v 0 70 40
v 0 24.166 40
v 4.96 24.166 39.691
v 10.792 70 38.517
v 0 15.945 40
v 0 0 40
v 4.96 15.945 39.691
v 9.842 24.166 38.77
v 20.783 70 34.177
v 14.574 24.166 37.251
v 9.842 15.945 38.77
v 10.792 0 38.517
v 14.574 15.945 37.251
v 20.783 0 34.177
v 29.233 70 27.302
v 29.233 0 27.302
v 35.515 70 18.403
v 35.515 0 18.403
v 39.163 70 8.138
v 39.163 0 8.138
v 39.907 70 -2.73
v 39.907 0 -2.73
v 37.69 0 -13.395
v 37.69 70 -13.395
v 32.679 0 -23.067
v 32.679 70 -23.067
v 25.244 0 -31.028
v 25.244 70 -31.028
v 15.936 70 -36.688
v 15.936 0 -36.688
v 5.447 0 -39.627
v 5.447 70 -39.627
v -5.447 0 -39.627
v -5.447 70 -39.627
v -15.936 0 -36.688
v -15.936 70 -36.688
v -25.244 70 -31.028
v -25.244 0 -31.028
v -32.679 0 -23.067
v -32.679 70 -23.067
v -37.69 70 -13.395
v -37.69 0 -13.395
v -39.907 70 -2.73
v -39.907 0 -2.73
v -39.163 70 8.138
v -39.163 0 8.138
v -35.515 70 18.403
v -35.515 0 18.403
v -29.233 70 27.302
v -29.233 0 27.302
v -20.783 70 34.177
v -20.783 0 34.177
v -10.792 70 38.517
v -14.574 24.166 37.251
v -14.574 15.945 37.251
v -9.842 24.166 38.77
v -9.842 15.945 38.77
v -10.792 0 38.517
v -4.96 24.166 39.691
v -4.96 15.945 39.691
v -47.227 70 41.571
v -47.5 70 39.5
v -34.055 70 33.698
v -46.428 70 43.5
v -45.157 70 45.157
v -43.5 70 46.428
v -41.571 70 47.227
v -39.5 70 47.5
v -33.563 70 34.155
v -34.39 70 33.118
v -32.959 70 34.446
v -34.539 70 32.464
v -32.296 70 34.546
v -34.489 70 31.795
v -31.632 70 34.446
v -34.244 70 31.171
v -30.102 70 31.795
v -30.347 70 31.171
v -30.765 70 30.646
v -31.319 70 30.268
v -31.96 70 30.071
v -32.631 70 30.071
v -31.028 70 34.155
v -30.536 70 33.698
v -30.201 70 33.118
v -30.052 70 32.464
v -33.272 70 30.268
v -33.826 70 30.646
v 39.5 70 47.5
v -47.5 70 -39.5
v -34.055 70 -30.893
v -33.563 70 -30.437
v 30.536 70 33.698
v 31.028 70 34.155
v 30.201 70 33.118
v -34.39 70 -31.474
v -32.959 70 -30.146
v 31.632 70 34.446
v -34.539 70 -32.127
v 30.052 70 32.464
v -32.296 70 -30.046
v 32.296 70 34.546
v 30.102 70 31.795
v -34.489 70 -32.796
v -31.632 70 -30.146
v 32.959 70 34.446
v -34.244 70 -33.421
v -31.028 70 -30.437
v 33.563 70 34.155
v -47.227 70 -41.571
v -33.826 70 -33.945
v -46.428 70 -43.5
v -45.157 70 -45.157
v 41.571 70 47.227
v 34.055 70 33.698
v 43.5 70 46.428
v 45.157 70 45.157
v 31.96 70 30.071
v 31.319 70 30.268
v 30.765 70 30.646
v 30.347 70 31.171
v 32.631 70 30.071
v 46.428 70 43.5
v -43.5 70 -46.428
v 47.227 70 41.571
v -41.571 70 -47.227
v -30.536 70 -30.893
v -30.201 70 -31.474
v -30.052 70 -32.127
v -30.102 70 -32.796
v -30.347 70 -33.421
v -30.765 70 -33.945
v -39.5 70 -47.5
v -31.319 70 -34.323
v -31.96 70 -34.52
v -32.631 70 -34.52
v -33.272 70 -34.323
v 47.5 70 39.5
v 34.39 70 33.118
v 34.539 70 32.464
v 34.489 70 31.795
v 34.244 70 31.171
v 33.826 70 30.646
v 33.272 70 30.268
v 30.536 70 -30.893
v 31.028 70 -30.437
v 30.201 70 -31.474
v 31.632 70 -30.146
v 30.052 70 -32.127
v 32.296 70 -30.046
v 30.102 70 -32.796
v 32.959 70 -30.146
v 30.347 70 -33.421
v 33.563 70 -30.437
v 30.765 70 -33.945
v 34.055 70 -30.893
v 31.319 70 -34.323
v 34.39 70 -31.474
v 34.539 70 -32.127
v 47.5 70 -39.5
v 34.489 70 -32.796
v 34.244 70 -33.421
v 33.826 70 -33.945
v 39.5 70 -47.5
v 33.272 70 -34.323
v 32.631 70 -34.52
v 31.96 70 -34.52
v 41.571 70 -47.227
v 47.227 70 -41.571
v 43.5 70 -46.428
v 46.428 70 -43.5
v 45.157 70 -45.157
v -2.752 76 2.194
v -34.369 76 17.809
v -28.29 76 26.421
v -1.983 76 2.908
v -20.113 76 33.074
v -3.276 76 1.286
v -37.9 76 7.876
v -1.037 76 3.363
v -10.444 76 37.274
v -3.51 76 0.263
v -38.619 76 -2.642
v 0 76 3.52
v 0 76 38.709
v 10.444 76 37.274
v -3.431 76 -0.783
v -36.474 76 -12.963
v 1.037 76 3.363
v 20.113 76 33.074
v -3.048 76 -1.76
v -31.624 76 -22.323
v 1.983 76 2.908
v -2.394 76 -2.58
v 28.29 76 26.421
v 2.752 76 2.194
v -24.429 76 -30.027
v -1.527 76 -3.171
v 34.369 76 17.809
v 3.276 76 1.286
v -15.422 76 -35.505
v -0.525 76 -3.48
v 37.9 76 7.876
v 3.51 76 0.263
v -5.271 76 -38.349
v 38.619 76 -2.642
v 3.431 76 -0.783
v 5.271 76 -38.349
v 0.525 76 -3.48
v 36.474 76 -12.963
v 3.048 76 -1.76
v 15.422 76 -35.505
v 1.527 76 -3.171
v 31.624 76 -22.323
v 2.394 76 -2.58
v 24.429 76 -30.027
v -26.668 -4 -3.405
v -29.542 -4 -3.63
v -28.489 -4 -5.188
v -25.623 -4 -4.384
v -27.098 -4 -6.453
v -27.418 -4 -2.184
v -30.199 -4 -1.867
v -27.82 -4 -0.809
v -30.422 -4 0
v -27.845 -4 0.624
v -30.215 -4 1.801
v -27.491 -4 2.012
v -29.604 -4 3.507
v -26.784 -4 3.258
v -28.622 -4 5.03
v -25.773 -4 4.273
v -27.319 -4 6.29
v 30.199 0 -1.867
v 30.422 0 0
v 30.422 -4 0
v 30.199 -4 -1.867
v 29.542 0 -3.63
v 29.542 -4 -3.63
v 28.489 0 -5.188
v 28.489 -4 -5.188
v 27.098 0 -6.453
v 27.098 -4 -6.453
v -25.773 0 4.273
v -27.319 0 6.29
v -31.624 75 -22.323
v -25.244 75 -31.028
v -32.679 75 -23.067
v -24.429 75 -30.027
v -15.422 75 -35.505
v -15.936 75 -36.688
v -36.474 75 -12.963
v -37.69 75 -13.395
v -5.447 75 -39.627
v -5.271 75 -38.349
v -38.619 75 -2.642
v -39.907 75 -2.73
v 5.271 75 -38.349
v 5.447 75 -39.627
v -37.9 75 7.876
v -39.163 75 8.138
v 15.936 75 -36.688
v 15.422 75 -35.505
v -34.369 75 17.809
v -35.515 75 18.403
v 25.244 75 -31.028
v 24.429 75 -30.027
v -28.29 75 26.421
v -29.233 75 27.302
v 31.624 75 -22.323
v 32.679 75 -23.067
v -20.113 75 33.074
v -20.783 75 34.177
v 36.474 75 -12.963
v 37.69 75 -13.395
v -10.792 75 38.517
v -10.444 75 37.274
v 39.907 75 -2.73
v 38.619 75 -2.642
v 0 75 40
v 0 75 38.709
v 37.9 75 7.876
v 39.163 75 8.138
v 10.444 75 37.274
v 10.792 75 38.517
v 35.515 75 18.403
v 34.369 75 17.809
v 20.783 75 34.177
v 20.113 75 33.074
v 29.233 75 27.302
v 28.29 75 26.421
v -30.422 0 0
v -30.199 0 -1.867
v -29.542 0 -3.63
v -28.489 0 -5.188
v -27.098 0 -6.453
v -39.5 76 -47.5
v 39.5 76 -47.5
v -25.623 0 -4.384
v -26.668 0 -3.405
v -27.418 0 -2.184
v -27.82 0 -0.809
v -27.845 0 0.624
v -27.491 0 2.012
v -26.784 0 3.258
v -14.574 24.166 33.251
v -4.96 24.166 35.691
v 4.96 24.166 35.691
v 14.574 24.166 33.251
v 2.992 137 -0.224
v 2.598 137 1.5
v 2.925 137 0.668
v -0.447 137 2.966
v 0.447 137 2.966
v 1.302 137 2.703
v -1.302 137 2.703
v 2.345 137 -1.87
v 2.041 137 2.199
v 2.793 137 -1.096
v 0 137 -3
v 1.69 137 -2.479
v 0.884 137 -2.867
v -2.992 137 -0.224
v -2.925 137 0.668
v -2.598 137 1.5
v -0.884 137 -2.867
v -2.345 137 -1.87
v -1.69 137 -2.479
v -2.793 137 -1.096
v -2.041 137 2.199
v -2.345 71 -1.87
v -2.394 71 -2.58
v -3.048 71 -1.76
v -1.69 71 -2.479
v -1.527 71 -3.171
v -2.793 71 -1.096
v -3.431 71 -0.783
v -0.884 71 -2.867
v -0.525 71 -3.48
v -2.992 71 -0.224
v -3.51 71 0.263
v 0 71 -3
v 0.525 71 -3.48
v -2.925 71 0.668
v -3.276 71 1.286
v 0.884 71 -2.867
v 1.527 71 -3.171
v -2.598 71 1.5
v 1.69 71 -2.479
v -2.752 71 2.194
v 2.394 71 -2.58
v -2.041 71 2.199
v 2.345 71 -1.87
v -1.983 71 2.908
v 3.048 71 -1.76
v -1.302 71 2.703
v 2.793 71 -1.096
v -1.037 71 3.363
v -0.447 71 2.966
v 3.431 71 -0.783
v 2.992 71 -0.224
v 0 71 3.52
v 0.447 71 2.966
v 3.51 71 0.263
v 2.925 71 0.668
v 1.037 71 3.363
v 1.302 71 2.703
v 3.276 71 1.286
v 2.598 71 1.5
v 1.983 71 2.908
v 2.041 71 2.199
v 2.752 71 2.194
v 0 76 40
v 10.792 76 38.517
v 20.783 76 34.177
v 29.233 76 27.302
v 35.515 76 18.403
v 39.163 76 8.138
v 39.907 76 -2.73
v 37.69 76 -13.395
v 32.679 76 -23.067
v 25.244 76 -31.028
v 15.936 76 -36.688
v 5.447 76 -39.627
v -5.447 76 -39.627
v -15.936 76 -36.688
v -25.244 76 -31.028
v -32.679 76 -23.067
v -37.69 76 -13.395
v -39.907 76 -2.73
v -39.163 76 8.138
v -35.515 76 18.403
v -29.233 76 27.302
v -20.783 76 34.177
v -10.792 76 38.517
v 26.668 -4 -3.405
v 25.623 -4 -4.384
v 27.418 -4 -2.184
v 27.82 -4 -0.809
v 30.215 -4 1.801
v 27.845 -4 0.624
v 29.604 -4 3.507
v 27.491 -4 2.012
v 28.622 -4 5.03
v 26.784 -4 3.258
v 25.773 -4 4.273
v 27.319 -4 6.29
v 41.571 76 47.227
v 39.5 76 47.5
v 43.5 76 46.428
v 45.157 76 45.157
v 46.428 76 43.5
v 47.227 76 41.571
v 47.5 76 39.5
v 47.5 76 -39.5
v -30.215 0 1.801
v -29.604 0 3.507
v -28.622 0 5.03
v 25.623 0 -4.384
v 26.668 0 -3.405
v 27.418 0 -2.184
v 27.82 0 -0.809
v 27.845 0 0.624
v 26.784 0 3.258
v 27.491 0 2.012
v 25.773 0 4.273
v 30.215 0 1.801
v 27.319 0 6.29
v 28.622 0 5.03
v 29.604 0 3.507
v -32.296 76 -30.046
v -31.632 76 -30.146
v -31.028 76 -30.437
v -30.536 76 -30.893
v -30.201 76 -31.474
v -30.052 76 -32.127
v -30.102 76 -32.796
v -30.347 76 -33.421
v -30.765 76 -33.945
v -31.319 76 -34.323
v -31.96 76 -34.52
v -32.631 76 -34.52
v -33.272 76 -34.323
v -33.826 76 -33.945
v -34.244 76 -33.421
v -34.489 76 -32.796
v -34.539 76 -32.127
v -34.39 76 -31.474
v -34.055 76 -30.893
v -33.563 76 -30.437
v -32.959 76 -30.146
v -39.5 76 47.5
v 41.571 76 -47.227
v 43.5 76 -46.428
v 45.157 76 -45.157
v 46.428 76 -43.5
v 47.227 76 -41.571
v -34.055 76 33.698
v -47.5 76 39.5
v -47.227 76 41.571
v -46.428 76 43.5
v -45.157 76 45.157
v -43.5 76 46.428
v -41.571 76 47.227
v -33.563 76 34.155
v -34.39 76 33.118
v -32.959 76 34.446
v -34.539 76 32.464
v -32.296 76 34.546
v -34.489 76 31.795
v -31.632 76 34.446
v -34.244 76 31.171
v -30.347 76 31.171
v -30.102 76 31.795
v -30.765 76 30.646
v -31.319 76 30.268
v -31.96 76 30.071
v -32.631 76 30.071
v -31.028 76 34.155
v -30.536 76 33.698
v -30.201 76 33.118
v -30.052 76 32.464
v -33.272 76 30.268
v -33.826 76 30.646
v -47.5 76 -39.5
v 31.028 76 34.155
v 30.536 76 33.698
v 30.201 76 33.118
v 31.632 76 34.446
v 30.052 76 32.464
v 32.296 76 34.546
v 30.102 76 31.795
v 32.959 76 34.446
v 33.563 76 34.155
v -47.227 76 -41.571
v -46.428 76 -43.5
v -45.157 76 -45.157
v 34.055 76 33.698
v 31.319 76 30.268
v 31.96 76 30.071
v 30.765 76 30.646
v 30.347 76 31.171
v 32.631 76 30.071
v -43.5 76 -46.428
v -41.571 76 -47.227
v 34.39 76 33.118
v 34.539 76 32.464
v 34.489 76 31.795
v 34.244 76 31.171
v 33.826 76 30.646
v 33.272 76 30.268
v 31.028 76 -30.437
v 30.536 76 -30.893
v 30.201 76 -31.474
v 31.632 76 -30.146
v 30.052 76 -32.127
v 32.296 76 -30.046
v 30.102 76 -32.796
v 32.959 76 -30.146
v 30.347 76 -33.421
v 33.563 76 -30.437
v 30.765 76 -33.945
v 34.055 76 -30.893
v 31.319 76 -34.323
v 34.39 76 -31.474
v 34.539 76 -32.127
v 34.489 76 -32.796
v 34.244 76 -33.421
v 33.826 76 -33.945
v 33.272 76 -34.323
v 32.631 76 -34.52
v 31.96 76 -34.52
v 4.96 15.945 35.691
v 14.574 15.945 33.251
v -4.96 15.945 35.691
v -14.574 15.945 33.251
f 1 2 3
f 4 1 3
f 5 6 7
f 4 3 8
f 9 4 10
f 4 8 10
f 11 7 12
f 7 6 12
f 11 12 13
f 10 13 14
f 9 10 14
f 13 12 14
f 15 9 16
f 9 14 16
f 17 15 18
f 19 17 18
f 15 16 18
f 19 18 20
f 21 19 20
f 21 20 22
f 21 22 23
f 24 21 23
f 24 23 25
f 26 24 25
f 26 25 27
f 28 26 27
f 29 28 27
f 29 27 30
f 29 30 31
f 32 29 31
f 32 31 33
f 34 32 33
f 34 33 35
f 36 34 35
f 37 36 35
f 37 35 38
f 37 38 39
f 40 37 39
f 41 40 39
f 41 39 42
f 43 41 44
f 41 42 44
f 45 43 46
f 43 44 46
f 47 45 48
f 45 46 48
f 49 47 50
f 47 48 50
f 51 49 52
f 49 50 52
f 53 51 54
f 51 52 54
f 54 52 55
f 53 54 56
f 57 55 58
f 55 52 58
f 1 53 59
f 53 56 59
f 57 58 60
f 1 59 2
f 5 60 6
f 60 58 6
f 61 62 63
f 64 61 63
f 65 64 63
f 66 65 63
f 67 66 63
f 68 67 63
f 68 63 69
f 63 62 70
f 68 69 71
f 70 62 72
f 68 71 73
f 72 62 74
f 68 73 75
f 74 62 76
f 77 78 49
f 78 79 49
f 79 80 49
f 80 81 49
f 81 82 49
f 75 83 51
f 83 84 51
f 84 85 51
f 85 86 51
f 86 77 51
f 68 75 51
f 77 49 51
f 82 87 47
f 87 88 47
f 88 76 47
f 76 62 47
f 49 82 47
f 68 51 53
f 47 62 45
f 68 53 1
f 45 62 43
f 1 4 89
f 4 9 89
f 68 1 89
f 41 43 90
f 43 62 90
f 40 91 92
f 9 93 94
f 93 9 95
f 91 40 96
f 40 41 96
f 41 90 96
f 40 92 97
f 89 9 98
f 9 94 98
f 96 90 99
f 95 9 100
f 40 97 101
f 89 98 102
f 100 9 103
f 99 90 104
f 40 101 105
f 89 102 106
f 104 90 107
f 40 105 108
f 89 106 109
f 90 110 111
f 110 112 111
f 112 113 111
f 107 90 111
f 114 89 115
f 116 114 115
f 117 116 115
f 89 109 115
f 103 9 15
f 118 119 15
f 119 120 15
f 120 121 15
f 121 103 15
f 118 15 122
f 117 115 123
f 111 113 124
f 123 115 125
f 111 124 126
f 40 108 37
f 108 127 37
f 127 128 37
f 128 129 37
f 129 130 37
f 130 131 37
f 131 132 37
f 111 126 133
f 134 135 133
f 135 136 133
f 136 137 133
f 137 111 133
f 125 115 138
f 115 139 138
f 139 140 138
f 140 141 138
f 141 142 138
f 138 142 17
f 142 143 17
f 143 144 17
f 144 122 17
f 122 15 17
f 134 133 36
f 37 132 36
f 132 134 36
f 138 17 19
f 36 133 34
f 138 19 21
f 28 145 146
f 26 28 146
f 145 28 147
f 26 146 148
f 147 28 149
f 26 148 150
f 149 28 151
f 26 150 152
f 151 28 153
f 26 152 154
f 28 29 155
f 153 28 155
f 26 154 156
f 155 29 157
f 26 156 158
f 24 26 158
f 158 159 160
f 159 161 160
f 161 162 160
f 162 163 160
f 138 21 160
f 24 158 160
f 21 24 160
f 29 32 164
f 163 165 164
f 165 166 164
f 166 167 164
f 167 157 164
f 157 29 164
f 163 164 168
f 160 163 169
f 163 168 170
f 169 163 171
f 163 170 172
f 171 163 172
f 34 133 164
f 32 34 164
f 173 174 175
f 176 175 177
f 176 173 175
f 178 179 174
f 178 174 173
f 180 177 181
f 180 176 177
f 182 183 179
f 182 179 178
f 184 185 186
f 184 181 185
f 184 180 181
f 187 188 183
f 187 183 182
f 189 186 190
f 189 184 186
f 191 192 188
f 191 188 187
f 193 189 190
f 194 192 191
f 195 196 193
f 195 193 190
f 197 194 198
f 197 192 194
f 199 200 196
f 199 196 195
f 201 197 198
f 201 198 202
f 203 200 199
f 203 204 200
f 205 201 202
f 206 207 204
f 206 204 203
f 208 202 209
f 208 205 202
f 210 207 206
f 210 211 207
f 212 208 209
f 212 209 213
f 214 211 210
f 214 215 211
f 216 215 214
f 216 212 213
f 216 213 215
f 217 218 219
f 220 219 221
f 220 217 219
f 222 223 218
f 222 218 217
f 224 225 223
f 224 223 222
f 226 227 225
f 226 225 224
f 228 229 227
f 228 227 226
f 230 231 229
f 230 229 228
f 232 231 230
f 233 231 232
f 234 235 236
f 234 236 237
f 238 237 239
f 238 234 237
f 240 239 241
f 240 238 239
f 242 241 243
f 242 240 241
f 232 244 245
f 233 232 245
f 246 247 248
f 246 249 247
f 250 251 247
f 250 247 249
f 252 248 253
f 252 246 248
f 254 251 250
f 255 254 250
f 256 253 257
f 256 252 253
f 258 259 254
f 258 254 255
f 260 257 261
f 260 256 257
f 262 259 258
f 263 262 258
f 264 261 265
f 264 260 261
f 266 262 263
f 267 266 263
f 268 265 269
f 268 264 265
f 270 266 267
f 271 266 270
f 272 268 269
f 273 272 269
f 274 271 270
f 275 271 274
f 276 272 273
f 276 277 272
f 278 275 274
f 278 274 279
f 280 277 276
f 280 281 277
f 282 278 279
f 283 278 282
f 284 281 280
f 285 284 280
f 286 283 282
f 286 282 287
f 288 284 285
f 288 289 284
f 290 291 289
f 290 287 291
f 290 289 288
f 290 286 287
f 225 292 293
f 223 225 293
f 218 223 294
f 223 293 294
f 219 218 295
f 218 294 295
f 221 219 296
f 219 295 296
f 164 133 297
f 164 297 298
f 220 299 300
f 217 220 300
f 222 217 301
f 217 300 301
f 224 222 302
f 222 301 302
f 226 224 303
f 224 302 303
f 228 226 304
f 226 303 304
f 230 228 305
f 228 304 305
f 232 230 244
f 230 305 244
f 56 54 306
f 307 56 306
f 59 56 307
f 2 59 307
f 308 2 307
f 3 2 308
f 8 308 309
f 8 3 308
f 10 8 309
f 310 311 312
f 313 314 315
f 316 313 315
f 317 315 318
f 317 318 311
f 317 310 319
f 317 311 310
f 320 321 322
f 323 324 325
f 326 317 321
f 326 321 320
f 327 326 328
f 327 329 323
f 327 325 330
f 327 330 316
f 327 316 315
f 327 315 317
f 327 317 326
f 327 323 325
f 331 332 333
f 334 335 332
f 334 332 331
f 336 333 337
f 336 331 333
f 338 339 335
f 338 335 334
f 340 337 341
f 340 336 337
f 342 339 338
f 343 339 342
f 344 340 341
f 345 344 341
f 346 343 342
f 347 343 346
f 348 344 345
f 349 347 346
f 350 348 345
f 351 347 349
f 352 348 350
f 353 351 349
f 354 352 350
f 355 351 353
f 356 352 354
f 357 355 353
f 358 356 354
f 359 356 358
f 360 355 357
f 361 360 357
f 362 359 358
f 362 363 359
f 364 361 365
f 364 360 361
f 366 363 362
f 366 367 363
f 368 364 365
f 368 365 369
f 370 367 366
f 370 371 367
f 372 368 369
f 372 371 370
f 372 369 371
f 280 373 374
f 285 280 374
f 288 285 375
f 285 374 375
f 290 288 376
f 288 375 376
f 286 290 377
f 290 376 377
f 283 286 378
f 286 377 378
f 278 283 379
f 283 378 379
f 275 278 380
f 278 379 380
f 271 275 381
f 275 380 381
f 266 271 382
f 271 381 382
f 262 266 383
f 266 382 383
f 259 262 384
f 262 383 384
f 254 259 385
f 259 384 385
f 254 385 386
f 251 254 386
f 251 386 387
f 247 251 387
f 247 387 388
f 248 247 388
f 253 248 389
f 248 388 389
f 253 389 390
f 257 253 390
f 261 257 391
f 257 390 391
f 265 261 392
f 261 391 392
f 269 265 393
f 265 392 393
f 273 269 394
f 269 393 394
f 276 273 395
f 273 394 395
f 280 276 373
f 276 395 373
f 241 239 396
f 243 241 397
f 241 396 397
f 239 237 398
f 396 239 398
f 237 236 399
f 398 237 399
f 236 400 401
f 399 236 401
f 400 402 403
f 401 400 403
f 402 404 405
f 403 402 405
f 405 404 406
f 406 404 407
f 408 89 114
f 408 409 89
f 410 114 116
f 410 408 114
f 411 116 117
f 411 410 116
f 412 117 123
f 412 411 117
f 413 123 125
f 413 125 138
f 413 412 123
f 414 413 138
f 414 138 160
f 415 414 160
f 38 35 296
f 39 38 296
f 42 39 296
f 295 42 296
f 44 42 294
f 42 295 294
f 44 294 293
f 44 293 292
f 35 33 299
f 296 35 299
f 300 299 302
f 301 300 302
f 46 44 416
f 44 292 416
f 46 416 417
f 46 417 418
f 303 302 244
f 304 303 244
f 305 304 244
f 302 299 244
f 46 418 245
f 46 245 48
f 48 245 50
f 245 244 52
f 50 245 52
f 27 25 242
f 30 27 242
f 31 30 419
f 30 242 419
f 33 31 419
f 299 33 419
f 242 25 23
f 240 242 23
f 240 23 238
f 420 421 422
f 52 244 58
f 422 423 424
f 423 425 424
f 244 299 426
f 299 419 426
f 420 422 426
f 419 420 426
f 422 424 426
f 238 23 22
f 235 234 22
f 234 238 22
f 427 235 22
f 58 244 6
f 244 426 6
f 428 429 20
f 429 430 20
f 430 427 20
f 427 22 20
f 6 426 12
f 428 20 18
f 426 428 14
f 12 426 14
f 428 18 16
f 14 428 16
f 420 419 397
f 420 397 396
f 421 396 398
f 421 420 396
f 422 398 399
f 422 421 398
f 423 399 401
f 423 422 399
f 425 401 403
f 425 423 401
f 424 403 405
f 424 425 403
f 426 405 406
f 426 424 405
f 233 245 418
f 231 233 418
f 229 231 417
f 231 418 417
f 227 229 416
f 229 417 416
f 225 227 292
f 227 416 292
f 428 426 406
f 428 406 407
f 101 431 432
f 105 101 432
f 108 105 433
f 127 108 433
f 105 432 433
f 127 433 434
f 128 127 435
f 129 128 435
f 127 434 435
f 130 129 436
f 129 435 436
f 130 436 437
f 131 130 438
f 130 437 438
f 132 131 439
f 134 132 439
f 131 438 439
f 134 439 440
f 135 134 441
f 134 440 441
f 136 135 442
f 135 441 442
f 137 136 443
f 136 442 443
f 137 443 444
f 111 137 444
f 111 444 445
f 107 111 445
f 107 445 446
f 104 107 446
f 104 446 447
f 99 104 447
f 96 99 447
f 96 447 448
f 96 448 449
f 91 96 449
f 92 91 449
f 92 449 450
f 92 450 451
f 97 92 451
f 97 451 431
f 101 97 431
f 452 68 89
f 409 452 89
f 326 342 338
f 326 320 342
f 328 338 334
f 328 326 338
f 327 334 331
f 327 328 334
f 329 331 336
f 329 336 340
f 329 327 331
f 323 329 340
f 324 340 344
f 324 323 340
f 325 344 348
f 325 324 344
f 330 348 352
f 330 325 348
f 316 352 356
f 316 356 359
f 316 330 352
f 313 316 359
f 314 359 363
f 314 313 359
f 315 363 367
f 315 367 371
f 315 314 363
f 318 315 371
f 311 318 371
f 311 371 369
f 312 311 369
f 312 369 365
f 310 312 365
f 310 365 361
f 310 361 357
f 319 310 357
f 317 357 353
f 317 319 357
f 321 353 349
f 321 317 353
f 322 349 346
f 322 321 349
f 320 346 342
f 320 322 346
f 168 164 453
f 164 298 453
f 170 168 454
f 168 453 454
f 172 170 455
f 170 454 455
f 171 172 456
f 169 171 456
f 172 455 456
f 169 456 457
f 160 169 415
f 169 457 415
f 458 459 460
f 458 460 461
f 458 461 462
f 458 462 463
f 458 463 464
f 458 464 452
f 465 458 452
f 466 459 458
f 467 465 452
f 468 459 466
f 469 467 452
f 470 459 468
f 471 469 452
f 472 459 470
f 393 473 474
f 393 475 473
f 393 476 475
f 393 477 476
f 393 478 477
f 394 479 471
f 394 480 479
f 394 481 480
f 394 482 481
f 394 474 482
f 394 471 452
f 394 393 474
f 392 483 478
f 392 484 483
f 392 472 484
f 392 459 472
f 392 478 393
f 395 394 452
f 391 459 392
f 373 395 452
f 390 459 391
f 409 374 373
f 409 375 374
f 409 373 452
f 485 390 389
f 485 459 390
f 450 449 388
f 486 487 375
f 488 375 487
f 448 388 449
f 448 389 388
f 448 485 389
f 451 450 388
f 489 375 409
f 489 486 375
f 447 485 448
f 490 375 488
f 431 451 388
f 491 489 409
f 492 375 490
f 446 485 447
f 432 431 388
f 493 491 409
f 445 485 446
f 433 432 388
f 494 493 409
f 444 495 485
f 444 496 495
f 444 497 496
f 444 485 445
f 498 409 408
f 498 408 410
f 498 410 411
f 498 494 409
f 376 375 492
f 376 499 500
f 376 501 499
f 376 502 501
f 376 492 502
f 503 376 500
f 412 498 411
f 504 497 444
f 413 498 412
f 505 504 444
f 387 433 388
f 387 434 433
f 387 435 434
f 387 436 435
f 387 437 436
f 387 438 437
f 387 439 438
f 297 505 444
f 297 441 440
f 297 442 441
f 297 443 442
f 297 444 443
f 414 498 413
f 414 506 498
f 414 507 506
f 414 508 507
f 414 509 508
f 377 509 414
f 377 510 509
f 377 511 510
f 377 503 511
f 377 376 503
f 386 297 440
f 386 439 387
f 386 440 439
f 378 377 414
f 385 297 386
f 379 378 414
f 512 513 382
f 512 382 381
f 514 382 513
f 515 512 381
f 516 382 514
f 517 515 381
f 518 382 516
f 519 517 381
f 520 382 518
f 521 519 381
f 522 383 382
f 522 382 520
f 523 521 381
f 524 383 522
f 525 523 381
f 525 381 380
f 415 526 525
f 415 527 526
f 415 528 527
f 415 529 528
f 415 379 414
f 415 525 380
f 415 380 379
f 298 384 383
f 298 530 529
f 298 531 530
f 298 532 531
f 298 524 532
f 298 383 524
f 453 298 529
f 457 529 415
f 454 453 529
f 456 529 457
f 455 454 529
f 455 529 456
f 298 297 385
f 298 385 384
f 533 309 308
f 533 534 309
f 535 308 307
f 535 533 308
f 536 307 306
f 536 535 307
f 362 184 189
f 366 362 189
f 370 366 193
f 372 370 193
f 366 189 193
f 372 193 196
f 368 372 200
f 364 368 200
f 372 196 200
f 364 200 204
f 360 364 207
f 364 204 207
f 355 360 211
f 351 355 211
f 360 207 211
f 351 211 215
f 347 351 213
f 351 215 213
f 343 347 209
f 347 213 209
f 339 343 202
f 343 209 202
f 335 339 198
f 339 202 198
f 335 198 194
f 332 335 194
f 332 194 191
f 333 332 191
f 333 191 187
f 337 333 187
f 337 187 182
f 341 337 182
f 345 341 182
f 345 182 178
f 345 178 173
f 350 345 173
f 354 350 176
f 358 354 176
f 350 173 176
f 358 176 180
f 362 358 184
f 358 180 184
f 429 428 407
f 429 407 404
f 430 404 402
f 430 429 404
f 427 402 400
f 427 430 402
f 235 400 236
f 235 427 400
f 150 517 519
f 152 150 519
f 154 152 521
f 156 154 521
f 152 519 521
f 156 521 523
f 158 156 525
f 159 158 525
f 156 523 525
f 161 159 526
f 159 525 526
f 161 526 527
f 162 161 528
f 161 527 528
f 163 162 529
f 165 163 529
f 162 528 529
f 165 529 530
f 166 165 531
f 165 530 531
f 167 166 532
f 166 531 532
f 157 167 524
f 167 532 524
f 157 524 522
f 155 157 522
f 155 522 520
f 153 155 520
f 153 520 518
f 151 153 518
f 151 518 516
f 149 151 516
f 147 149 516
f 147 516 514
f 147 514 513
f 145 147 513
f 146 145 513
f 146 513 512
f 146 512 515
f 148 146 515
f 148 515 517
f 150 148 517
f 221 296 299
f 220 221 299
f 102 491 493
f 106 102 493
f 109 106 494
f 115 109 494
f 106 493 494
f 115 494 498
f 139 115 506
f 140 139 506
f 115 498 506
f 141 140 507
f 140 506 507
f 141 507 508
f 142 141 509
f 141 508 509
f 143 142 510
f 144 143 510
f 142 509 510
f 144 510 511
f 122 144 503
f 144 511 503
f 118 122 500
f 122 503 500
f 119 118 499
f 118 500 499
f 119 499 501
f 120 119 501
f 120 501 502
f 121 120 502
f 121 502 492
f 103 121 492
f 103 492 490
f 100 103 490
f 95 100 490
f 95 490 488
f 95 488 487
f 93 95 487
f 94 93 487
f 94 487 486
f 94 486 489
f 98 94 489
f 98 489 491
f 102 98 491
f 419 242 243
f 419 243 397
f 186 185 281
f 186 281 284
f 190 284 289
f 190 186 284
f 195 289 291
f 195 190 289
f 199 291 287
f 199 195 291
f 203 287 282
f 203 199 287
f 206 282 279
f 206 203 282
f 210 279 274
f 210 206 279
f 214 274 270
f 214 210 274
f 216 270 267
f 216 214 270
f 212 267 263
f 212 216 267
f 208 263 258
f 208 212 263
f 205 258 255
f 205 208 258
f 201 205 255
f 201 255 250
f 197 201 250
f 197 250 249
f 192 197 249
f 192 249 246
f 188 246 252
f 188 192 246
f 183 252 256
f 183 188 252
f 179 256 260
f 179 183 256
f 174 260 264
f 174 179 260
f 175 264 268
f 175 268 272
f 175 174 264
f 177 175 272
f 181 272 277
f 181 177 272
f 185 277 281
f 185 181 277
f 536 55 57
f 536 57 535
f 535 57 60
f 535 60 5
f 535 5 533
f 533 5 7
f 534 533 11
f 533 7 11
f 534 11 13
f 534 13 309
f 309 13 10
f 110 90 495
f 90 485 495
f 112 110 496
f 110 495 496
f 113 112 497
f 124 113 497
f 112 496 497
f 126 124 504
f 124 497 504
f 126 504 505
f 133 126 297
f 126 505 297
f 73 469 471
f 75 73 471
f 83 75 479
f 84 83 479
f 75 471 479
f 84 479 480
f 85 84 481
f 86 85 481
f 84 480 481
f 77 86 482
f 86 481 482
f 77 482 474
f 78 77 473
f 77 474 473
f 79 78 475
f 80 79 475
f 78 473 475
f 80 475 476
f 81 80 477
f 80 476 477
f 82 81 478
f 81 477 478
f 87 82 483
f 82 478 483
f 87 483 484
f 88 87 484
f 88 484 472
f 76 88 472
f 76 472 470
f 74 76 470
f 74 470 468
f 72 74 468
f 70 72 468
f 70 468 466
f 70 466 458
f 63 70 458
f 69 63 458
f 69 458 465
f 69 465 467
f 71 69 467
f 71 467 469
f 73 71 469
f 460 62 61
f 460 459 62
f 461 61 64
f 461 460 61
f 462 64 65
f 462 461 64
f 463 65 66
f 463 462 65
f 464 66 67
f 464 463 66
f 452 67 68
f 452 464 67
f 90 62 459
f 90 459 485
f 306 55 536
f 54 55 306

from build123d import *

# Parameters (mm, degrees)
SKETCH1_R                 = 40
BOSS_EXTRUDE1_DEPTH       = 70
SKETCH2_W                 = 95
SKETCH2_H                 = 95
BOSS_EXTRUDE2_DEPTH       = 6
SKETCH3_R                 = 40
SKETCH3_R_2               = 38.709273032
CUT_EXTRUDE1_DEPTH        = 1
SKETCH4_R                 = 3
BOSS_EXTRUDE3_DEPTH       = 61
FILLET1_R                 = 8
SKETCH6_R                 = 3.519560707
SKETCH6_R_2               = 3
CUT_EXTRUDE3_DEPTH        = 5
CUT_EXTRUDE4_REACH        = 158.583
CUT_EXTRUDE4_START_RADIUS = 40
CUT_EXTRUDE4_END_RADIUS   = 40
SKETCH8_W                 = 29.147137568
SKETCH8_H                 = 8.22098752
BOSS_EXTRUDE5_DEPTH       = 4
SKETCH10_R                = 2.25
CUT_EXTRUDE5_DEPTH        = 34


with BuildPart() as part:
    # Sketch1 → Boss-Extrude1 (new body)
    with BuildSketch(Plane(origin=(0, 0, 0), x_dir=(1, 0, 0), z_dir=(0, 1, 0))):
        with Locations(Location((0, 0, 0), (0, 0, 270))):
            Circle(SKETCH1_R)
    extrude(amount=BOSS_EXTRUDE1_DEPTH)

    # Sketch2 → Boss-Extrude2 (add)
    with BuildSketch(Plane(origin=(0, 70, 0), x_dir=(1, 0, 0), z_dir=(0, 1, 0))):
        Rectangle(SKETCH2_W, SKETCH2_H)
    extrude(amount=BOSS_EXTRUDE2_DEPTH)

    # Sketch3 → Cut-Extrude1 (cut)
    with BuildSketch(Plane(origin=(0, 76, 0), x_dir=(1, 0, 0), z_dir=(0, 1, 0))):
        with Locations(Location((0, 0, 0), (0, 0, 270))):
            Circle(SKETCH3_R)
        with Locations(Location((0, 0, 0), (0, 0, 270))):
            Circle(SKETCH3_R_2, mode=Mode.SUBTRACT)
    extrude(amount=-CUT_EXTRUDE1_DEPTH, mode=Mode.SUBTRACT)

    # Sketch4 → Boss-Extrude3 (add)
    with BuildSketch(Plane(origin=(0, 76, 0), x_dir=(1, 0, 0), z_dir=(0, 1, 0))):
        with Locations(Location((0, 0, 0), (0, 0, 90))):
            Circle(SKETCH4_R)
    extrude(amount=BOSS_EXTRUDE3_DEPTH)

    # Fillet1
    fillet1_edges = [part.edges().sort_by_distance(p)[0] for p in [
        (47.5, 73, 47.5),
        (47.5, 73, -47.5),
        (-47.5, 73, -47.5),
        (-47.5, 73, 47.5),
    ]]
    fillet(fillet1_edges, radius=FILLET1_R)

    # Sketch6 → Cut-Extrude3 (cut)
    with BuildSketch(Plane(origin=(0, 76, 0), x_dir=(1, 0, 0), z_dir=(0, 1, 0))):
        with Locations(Location((0, 0, 0), (0, 0, 270))):
            Circle(SKETCH6_R)
        with Locations(Location((0, 0, 0), (0, 0, 90))):
            Circle(SKETCH6_R_2, mode=Mode.SUBTRACT)
    extrude(amount=-CUT_EXTRUDE3_DEPTH, mode=Mode.SUBTRACT)

    # Cut-Extrude4: from a cylinder face, 158.583 long prism both ways, kept between that surface and its translate by the depth
    cut_extrude4_start = Plane(origin=(0, 20.055809, 0), z_dir=(0, -1, 0)) * Cylinder(CUT_EXTRUDE4_START_RADIUS, 398.166, mode=Mode.PRIVATE)
    cut_extrude4_end = Plane(origin=(0, 20.055809, -4), z_dir=(0, -1, 0)) * Cylinder(CUT_EXTRUDE4_END_RADIUS, 398.166, mode=Mode.PRIVATE)
    # Sketch8 → Cut-Extrude4 (cut, from a surface)
    with BuildSketch(Plane.XY, mode=Mode.PRIVATE) as cut_extrude4_sk1:
        with Locations((0, 20.055809212)):
            Rectangle(SKETCH8_W, SKETCH8_H)
    cut_extrude4_tool1 = extrude(cut_extrude4_sk1.sketch, amount=CUT_EXTRUDE4_REACH, both=True, mode=Mode.PRIVATE)
    add(((cut_extrude4_tool1 & cut_extrude4_start) - cut_extrude4_end).solids().sort_by_distance((0, 20.055809, 35.250652))[0], mode=Mode.SUBTRACT)

    # Sketch9 → Boss-Extrude5 (add)
    with BuildSketch(Plane.XZ):
        with BuildLine():
            ThreePointArc((-25.622676251, -4.384366141), (-27.880429407, -0.093420807), (-25.772900348, 4.273269294))
            Line((-25.772900348, 4.273269294), (-27.319093183, 6.289872554))
            ThreePointArc((-27.319093183, 6.289872554), (-29.604344551, 3.506882349), (-30.422381519, 0))
            ThreePointArc((-30.422381519, 0), (-29.542433802, -3.629669529), (-27.097976665, -6.453397238))
            Line((-27.097976665, -6.453397238), (-25.622676251, -4.384366141))
        make_face()
    boss_extrude5 = extrude(amount=BOSS_EXTRUDE5_DEPTH)

    # Mirror1: Boss-Extrude5 across plane
    add(boss_extrude5.mirror(Plane(origin=(0, 0, 0), x_dir=(0, 0, 1), z_dir=(1, 0, 0))))

    # Sketch10 → Cut-Extrude5 (cut)
    with BuildSketch(Plane(origin=(0, 76, 0), x_dir=(1, 0, 0), z_dir=(0, 1, 0))):
        with Locations(Location((-32.295599691, 32.295599691, 0), (0, 0, 270))):
            Circle(SKETCH10_R)
        with Locations(Location((32.295599691, 32.295599691, 0), (0, 0, 270))):
            Circle(SKETCH10_R)
        with Locations(Location((32.295599691, -32.295599691, 0), (0, 0, 270))):
            Circle(SKETCH10_R)
        with Locations(Location((-32.295599691, -32.295599691, 0), (0, 0, 270))):
            Circle(SKETCH10_R)
    extrude(amount=-CUT_EXTRUDE5_DEPTH, mode=Mode.SUBTRACT)


solid = part.part
